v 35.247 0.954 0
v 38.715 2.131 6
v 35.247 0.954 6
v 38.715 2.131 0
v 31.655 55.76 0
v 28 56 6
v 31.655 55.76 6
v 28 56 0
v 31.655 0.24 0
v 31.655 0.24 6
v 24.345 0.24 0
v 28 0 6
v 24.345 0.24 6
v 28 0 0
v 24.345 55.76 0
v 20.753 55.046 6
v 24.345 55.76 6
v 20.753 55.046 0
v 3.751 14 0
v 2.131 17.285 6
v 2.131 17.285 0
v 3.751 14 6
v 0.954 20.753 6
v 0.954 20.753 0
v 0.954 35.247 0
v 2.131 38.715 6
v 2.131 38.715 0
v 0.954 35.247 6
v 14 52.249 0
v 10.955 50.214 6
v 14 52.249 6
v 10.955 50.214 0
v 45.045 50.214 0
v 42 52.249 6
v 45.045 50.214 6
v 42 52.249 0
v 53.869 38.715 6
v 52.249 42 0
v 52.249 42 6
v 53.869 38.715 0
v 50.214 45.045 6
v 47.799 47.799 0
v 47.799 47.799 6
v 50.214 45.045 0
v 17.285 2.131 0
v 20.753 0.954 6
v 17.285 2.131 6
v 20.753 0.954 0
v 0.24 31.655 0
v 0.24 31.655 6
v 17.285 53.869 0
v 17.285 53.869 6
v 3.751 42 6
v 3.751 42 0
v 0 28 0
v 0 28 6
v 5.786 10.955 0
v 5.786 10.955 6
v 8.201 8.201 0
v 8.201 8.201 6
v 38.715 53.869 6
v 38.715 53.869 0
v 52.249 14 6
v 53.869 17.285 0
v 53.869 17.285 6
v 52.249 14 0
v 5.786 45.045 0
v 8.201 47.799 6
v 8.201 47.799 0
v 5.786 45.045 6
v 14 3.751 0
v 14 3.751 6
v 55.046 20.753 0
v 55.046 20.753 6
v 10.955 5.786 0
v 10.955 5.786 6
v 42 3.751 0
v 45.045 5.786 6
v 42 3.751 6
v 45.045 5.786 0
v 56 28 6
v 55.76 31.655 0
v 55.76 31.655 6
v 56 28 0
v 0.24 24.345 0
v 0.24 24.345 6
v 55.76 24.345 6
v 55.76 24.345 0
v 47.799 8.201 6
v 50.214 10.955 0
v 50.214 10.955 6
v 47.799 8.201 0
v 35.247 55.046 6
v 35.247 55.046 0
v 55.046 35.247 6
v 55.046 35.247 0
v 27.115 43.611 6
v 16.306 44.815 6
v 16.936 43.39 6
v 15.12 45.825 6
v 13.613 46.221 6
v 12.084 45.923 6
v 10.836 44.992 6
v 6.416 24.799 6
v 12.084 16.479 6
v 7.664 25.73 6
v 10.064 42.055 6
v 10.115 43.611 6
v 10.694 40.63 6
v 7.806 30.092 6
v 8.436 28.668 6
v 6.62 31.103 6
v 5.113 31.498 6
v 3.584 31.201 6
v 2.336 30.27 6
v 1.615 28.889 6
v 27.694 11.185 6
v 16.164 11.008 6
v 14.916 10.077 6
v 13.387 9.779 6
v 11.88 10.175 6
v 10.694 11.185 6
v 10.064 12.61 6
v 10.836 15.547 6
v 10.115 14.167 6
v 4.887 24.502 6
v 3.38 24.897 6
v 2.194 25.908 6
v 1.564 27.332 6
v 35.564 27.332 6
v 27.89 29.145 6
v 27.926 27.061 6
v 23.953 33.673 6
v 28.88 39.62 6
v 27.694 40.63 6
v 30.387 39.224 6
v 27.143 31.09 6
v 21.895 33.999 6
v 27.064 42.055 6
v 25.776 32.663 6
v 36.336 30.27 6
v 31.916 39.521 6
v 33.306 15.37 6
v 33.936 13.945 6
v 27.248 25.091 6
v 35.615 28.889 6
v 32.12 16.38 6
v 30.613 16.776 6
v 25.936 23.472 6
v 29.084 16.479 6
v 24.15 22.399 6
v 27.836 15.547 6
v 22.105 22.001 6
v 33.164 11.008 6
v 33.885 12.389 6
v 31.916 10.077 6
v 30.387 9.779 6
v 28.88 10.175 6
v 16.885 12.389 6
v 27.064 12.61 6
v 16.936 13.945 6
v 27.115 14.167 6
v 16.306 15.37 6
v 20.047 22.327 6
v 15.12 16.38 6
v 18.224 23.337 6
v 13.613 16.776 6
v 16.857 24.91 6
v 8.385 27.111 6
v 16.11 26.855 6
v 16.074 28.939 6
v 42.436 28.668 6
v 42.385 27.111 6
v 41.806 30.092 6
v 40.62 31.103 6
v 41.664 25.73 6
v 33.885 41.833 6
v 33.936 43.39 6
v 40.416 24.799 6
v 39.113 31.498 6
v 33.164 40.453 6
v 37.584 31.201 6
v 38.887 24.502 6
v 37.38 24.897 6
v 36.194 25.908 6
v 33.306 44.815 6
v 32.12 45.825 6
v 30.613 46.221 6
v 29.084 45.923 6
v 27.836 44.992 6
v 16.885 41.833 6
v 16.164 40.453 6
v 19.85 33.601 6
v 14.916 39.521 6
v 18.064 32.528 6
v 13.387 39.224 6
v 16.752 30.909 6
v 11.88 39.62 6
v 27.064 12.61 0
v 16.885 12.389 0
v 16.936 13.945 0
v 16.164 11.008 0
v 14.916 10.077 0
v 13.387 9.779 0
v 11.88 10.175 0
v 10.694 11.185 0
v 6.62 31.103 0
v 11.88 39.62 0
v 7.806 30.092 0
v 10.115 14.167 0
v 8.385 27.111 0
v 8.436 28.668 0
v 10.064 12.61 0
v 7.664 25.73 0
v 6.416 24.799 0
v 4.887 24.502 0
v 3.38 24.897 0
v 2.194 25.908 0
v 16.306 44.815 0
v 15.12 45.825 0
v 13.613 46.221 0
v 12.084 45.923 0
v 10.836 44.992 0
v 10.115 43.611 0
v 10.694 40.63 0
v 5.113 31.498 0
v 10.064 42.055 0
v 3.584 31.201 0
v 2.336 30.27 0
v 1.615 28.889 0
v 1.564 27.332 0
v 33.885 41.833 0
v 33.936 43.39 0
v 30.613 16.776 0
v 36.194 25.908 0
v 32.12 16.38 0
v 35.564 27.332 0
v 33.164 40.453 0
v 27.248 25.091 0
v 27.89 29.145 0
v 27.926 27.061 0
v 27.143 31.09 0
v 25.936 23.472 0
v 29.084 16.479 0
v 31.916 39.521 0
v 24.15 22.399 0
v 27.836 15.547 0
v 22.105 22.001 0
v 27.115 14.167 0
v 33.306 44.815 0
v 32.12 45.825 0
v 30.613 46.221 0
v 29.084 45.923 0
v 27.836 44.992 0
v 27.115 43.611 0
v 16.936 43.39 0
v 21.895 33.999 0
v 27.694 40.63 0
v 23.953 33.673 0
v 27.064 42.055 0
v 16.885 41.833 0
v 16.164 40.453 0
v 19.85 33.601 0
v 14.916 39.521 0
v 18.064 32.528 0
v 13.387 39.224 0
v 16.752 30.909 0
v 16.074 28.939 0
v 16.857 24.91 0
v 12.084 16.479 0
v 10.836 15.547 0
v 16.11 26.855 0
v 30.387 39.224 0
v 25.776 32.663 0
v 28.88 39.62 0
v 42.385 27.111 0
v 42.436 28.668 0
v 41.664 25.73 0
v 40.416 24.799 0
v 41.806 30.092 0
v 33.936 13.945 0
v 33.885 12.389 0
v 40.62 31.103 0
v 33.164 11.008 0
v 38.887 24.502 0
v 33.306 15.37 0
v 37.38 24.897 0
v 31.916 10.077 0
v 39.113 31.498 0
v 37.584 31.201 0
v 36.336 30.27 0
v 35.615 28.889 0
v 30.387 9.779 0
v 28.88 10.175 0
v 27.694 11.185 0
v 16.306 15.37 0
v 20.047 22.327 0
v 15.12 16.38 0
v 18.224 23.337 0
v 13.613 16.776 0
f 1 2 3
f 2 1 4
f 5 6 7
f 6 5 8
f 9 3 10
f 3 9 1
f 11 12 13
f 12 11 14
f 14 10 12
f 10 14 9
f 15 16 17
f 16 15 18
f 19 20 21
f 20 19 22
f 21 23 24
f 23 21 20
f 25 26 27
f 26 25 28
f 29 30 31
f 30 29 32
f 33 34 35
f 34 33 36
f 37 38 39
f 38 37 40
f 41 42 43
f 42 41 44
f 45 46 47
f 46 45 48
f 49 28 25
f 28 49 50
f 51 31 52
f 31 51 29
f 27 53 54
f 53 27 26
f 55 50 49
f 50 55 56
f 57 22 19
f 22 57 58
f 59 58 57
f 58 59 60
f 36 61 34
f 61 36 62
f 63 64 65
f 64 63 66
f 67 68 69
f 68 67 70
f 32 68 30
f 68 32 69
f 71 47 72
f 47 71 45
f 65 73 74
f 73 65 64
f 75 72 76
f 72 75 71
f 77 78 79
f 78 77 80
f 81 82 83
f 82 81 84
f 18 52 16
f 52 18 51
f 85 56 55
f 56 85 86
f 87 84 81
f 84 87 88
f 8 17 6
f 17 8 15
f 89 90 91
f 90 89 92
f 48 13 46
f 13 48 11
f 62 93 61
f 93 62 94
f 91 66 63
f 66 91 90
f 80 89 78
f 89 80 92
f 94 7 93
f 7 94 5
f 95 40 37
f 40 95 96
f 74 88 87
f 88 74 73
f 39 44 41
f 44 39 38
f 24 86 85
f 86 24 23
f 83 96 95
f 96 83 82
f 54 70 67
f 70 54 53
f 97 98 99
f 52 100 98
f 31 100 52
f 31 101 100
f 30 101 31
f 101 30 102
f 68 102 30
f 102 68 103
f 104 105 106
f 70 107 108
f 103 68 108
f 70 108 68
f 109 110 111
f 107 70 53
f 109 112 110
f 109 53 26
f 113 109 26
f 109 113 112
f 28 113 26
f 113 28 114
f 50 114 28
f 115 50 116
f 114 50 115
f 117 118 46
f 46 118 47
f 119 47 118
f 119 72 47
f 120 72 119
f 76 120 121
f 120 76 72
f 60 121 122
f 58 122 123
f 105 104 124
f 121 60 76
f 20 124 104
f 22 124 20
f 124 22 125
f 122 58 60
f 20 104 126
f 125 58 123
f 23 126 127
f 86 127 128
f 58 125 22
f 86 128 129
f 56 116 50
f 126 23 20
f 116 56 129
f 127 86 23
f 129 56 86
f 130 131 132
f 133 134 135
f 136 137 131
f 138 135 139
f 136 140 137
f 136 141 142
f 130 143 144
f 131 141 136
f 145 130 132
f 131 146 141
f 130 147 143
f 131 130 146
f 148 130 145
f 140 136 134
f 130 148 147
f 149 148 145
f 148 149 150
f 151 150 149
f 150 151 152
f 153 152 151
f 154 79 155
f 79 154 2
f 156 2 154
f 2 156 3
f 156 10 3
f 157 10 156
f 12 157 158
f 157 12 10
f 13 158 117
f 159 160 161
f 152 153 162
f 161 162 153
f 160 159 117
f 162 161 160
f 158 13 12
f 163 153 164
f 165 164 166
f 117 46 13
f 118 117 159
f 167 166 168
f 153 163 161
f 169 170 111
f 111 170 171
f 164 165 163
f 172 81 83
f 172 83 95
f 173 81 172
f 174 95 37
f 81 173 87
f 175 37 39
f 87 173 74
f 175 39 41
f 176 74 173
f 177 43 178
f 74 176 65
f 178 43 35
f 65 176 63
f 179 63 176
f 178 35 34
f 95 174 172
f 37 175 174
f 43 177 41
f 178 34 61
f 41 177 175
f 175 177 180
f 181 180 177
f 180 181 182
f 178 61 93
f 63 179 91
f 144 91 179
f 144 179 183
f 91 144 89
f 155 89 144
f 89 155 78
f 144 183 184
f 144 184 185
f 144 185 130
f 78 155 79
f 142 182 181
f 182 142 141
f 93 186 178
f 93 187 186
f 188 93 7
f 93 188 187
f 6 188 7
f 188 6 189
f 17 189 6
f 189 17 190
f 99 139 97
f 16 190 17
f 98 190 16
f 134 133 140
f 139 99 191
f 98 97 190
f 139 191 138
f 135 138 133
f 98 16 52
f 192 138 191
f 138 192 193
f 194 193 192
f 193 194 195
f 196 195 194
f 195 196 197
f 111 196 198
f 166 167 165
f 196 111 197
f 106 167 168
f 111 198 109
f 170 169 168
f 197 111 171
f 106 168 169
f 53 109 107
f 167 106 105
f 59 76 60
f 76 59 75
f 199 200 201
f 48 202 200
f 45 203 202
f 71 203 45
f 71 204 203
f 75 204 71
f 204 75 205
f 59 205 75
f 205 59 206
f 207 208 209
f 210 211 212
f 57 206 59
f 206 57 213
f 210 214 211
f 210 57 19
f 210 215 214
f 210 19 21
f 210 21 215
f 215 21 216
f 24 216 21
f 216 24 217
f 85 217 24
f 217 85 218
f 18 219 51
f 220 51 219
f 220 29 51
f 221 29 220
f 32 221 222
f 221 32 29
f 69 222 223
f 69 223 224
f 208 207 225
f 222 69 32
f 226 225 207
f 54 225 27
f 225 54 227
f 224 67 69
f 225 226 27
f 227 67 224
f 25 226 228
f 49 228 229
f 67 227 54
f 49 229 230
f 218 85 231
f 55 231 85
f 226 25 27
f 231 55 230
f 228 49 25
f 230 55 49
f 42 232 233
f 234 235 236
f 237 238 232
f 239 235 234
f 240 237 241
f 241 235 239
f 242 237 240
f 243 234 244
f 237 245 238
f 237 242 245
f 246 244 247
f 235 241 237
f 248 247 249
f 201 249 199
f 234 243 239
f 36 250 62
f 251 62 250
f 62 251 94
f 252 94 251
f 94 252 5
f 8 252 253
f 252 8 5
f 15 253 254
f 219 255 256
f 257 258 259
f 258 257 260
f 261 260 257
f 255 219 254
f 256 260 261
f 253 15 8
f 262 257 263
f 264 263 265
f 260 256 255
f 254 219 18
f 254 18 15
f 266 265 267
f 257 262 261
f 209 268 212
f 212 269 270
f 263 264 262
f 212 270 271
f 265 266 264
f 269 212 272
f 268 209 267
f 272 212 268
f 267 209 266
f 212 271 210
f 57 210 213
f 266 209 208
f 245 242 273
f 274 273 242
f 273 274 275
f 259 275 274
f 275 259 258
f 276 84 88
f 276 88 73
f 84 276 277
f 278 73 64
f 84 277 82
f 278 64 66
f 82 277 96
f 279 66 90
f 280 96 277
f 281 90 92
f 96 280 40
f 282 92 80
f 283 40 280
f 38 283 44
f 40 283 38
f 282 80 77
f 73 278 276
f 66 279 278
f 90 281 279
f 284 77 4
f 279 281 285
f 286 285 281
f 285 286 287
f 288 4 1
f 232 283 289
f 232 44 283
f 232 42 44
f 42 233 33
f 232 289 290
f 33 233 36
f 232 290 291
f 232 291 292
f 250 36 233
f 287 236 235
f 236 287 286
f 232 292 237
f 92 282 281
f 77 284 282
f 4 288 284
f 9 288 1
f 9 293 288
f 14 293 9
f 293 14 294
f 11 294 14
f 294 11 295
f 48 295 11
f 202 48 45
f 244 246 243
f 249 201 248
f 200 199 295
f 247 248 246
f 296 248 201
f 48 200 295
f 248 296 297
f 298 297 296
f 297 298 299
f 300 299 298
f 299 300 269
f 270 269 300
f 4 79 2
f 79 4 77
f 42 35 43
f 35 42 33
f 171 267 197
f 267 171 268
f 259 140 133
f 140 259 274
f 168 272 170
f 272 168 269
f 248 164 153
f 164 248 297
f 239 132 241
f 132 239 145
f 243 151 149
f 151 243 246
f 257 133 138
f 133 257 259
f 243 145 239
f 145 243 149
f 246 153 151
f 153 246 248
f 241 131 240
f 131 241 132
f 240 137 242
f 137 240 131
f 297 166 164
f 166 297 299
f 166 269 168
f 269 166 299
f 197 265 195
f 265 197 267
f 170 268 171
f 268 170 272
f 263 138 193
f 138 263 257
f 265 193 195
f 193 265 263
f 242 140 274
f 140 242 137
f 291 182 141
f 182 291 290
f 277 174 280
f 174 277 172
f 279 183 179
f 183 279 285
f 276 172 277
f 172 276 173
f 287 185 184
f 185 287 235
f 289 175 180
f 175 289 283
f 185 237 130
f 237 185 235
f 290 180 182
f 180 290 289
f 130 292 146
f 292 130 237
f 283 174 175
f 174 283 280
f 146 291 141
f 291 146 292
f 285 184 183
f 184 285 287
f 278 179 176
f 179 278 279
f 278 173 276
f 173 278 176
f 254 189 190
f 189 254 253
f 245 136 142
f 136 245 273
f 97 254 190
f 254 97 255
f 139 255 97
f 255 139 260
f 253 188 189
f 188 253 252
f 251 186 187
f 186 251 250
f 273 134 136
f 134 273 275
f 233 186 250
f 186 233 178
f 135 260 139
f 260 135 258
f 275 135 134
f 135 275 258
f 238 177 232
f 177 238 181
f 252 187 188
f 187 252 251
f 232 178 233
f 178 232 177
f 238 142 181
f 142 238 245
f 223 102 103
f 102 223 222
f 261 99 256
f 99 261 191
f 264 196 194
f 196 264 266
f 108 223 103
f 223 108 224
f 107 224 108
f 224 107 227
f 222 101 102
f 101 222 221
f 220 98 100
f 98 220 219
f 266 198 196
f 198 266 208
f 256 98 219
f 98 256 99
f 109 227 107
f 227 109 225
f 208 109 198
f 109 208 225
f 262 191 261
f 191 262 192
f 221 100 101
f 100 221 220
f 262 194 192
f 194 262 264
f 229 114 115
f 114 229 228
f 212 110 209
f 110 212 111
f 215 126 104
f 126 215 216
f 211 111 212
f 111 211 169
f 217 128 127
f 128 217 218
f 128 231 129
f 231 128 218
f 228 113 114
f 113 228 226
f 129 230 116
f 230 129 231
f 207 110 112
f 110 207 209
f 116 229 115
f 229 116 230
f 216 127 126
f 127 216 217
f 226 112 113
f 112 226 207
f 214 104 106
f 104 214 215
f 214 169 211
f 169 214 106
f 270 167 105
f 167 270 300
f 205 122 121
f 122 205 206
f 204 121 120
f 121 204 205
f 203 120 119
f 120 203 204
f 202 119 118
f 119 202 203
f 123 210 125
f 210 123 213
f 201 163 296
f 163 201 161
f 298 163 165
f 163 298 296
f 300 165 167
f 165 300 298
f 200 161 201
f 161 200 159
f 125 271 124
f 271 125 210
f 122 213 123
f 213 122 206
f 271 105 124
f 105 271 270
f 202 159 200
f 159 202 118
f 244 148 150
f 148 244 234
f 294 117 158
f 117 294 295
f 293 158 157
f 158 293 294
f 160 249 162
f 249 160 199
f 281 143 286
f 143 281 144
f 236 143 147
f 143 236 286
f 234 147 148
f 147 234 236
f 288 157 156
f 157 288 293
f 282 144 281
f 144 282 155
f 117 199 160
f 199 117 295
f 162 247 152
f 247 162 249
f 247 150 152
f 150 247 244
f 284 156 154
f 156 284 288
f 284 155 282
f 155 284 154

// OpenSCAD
$fn = 32;
// target_bbox: 56, 56, 6
// ----------------------------------------------------------------------
// Cam plate: eccentric cam, base R28
// ----------------------------------------------------------------------

// --- parameters (mm) ---
base_r = 28;              // base circle radius
lobe_h = 8;               // cam lobe rise
bore_r = 6;               // shaft bore radius
plate_t = 6;              // plate thickness, Z (extrusion height)
ecc = 6;                  // disc eccentricity
ring_r = 17;              // lightening ring radius
bolt_r = 3.5;             // lightening hole radius

profile = [[56, 28], [55.76, 31.655], [55.046, 35.247], [53.869, 38.715], [52.249, 42], [50.214, 45.045], [47.799, 47.799], [45.045, 50.214], [42, 52.249], [38.715, 53.869], [35.247, 55.046], [31.655, 55.76], [28, 56], [24.345, 55.76], [20.753, 55.046], [17.285, 53.869], [14, 52.249], [10.955, 50.214], [8.201, 47.799], [5.786, 45.045], [3.751, 42], [2.131, 38.715], [0.954, 35.247], [0.24, 31.655], [0, 28], [0.24, 24.345], [0.954, 20.753], [2.131, 17.285], [3.751, 14], [5.786, 10.955], [8.201, 8.201], [10.955, 5.786], [14, 3.751], [17.285, 2.131], [20.753, 0.954], [24.345, 0.24], [28, 0], [31.655, 0.24], [35.247, 0.954], [38.715, 2.131], [42, 3.751], [45.045, 5.786], [47.799, 8.201], [50.214, 10.955], [52.249, 14], [53.869, 17.285], [55.046, 20.753], [55.76, 24.345]];  // primary outline, 48 points, counter clockwise
void_1 = [[27.89, 29.145], [27.143, 31.09], [25.776, 32.663], [23.953, 33.673], [21.895, 33.999], [19.85, 33.601], [18.064, 32.528], [16.752, 30.909], [16.074, 28.939], [16.11, 26.855], [16.857, 24.91], [18.224, 23.337], [20.047, 22.327], [22.105, 22.001], [24.15, 22.399], [25.936, 23.472], [27.248, 25.091], [27.926, 27.061]];  // shaft bore, 18 points
void_2 = [[42.436, 28.668], [41.806, 30.092], [40.62, 31.103], [39.113, 31.498], [37.584, 31.201], [36.336, 30.27], [35.615, 28.889], [35.564, 27.332], [36.194, 25.908], [37.38, 24.897], [38.887, 24.502], [40.416, 24.799], [41.664, 25.73], [42.385, 27.111]];  // lightening hole 1, 14 points
void_3 = [[33.936, 43.39], [33.306, 44.815], [32.12, 45.825], [30.613, 46.221], [29.084, 45.923], [27.836, 44.992], [27.115, 43.611], [27.064, 42.055], [27.694, 40.63], [28.88, 39.62], [30.387, 39.224], [31.916, 39.521], [33.164, 40.453], [33.885, 41.833]];  // lightening hole 2, 14 points
void_4 = [[16.936, 43.39], [16.306, 44.815], [15.12, 45.825], [13.613, 46.221], [12.084, 45.923], [10.836, 44.992], [10.115, 43.611], [10.064, 42.055], [10.694, 40.63], [11.88, 39.62], [13.387, 39.224], [14.916, 39.521], [16.164, 40.453], [16.885, 41.833]];  // lightening hole 3, 14 points
void_5 = [[8.436, 28.668], [7.806, 30.092], [6.62, 31.103], [5.113, 31.498], [3.584, 31.201], [2.336, 30.27], [1.615, 28.889], [1.564, 27.332], [2.194, 25.908], [3.38, 24.897], [4.887, 24.502], [6.416, 24.799], [7.664, 25.73], [8.385, 27.111]];  // lightening hole 4, 14 points
void_6 = [[16.936, 13.945], [16.306, 15.37], [15.12, 16.38], [13.613, 16.776], [12.084, 16.479], [10.836, 15.547], [10.115, 14.167], [10.064, 12.61], [10.694, 11.185], [11.88, 10.175], [13.387, 9.779], [14.916, 10.077], [16.164, 11.008], [16.885, 12.389]];  // lightening hole 5, 14 points
void_7 = [[33.936, 13.945], [33.306, 15.37], [32.12, 16.38], [30.613, 16.776], [29.084, 16.479], [27.836, 15.547], [27.115, 14.167], [27.064, 12.61], [27.694, 11.185], [28.88, 10.175], [30.387, 9.779], [31.916, 10.077], [33.164, 11.008], [33.885, 12.389]];  // lightening hole 6, 14 points

// --- the one profile operation ---
difference() {
  linear_extrude(height = plate_t) polygon(points = profile);
  translate([0, 0, -1])
    linear_extrude(height = plate_t + 2) polygon(points = void_1);
  translate([0, 0, -1])
    linear_extrude(height = plate_t + 2) polygon(points = void_2);
  translate([0, 0, -1])
    linear_extrude(height = plate_t + 2) polygon(points = void_3);
  translate([0, 0, -1])
    linear_extrude(height = plate_t + 2) polygon(points = void_4);
  translate([0, 0, -1])
    linear_extrude(height = plate_t + 2) polygon(points = void_5);
  translate([0, 0, -1])
    linear_extrude(height = plate_t + 2) polygon(points = void_6);
  translate([0, 0, -1])
    linear_extrude(height = plate_t + 2) polygon(points = void_7);
}
